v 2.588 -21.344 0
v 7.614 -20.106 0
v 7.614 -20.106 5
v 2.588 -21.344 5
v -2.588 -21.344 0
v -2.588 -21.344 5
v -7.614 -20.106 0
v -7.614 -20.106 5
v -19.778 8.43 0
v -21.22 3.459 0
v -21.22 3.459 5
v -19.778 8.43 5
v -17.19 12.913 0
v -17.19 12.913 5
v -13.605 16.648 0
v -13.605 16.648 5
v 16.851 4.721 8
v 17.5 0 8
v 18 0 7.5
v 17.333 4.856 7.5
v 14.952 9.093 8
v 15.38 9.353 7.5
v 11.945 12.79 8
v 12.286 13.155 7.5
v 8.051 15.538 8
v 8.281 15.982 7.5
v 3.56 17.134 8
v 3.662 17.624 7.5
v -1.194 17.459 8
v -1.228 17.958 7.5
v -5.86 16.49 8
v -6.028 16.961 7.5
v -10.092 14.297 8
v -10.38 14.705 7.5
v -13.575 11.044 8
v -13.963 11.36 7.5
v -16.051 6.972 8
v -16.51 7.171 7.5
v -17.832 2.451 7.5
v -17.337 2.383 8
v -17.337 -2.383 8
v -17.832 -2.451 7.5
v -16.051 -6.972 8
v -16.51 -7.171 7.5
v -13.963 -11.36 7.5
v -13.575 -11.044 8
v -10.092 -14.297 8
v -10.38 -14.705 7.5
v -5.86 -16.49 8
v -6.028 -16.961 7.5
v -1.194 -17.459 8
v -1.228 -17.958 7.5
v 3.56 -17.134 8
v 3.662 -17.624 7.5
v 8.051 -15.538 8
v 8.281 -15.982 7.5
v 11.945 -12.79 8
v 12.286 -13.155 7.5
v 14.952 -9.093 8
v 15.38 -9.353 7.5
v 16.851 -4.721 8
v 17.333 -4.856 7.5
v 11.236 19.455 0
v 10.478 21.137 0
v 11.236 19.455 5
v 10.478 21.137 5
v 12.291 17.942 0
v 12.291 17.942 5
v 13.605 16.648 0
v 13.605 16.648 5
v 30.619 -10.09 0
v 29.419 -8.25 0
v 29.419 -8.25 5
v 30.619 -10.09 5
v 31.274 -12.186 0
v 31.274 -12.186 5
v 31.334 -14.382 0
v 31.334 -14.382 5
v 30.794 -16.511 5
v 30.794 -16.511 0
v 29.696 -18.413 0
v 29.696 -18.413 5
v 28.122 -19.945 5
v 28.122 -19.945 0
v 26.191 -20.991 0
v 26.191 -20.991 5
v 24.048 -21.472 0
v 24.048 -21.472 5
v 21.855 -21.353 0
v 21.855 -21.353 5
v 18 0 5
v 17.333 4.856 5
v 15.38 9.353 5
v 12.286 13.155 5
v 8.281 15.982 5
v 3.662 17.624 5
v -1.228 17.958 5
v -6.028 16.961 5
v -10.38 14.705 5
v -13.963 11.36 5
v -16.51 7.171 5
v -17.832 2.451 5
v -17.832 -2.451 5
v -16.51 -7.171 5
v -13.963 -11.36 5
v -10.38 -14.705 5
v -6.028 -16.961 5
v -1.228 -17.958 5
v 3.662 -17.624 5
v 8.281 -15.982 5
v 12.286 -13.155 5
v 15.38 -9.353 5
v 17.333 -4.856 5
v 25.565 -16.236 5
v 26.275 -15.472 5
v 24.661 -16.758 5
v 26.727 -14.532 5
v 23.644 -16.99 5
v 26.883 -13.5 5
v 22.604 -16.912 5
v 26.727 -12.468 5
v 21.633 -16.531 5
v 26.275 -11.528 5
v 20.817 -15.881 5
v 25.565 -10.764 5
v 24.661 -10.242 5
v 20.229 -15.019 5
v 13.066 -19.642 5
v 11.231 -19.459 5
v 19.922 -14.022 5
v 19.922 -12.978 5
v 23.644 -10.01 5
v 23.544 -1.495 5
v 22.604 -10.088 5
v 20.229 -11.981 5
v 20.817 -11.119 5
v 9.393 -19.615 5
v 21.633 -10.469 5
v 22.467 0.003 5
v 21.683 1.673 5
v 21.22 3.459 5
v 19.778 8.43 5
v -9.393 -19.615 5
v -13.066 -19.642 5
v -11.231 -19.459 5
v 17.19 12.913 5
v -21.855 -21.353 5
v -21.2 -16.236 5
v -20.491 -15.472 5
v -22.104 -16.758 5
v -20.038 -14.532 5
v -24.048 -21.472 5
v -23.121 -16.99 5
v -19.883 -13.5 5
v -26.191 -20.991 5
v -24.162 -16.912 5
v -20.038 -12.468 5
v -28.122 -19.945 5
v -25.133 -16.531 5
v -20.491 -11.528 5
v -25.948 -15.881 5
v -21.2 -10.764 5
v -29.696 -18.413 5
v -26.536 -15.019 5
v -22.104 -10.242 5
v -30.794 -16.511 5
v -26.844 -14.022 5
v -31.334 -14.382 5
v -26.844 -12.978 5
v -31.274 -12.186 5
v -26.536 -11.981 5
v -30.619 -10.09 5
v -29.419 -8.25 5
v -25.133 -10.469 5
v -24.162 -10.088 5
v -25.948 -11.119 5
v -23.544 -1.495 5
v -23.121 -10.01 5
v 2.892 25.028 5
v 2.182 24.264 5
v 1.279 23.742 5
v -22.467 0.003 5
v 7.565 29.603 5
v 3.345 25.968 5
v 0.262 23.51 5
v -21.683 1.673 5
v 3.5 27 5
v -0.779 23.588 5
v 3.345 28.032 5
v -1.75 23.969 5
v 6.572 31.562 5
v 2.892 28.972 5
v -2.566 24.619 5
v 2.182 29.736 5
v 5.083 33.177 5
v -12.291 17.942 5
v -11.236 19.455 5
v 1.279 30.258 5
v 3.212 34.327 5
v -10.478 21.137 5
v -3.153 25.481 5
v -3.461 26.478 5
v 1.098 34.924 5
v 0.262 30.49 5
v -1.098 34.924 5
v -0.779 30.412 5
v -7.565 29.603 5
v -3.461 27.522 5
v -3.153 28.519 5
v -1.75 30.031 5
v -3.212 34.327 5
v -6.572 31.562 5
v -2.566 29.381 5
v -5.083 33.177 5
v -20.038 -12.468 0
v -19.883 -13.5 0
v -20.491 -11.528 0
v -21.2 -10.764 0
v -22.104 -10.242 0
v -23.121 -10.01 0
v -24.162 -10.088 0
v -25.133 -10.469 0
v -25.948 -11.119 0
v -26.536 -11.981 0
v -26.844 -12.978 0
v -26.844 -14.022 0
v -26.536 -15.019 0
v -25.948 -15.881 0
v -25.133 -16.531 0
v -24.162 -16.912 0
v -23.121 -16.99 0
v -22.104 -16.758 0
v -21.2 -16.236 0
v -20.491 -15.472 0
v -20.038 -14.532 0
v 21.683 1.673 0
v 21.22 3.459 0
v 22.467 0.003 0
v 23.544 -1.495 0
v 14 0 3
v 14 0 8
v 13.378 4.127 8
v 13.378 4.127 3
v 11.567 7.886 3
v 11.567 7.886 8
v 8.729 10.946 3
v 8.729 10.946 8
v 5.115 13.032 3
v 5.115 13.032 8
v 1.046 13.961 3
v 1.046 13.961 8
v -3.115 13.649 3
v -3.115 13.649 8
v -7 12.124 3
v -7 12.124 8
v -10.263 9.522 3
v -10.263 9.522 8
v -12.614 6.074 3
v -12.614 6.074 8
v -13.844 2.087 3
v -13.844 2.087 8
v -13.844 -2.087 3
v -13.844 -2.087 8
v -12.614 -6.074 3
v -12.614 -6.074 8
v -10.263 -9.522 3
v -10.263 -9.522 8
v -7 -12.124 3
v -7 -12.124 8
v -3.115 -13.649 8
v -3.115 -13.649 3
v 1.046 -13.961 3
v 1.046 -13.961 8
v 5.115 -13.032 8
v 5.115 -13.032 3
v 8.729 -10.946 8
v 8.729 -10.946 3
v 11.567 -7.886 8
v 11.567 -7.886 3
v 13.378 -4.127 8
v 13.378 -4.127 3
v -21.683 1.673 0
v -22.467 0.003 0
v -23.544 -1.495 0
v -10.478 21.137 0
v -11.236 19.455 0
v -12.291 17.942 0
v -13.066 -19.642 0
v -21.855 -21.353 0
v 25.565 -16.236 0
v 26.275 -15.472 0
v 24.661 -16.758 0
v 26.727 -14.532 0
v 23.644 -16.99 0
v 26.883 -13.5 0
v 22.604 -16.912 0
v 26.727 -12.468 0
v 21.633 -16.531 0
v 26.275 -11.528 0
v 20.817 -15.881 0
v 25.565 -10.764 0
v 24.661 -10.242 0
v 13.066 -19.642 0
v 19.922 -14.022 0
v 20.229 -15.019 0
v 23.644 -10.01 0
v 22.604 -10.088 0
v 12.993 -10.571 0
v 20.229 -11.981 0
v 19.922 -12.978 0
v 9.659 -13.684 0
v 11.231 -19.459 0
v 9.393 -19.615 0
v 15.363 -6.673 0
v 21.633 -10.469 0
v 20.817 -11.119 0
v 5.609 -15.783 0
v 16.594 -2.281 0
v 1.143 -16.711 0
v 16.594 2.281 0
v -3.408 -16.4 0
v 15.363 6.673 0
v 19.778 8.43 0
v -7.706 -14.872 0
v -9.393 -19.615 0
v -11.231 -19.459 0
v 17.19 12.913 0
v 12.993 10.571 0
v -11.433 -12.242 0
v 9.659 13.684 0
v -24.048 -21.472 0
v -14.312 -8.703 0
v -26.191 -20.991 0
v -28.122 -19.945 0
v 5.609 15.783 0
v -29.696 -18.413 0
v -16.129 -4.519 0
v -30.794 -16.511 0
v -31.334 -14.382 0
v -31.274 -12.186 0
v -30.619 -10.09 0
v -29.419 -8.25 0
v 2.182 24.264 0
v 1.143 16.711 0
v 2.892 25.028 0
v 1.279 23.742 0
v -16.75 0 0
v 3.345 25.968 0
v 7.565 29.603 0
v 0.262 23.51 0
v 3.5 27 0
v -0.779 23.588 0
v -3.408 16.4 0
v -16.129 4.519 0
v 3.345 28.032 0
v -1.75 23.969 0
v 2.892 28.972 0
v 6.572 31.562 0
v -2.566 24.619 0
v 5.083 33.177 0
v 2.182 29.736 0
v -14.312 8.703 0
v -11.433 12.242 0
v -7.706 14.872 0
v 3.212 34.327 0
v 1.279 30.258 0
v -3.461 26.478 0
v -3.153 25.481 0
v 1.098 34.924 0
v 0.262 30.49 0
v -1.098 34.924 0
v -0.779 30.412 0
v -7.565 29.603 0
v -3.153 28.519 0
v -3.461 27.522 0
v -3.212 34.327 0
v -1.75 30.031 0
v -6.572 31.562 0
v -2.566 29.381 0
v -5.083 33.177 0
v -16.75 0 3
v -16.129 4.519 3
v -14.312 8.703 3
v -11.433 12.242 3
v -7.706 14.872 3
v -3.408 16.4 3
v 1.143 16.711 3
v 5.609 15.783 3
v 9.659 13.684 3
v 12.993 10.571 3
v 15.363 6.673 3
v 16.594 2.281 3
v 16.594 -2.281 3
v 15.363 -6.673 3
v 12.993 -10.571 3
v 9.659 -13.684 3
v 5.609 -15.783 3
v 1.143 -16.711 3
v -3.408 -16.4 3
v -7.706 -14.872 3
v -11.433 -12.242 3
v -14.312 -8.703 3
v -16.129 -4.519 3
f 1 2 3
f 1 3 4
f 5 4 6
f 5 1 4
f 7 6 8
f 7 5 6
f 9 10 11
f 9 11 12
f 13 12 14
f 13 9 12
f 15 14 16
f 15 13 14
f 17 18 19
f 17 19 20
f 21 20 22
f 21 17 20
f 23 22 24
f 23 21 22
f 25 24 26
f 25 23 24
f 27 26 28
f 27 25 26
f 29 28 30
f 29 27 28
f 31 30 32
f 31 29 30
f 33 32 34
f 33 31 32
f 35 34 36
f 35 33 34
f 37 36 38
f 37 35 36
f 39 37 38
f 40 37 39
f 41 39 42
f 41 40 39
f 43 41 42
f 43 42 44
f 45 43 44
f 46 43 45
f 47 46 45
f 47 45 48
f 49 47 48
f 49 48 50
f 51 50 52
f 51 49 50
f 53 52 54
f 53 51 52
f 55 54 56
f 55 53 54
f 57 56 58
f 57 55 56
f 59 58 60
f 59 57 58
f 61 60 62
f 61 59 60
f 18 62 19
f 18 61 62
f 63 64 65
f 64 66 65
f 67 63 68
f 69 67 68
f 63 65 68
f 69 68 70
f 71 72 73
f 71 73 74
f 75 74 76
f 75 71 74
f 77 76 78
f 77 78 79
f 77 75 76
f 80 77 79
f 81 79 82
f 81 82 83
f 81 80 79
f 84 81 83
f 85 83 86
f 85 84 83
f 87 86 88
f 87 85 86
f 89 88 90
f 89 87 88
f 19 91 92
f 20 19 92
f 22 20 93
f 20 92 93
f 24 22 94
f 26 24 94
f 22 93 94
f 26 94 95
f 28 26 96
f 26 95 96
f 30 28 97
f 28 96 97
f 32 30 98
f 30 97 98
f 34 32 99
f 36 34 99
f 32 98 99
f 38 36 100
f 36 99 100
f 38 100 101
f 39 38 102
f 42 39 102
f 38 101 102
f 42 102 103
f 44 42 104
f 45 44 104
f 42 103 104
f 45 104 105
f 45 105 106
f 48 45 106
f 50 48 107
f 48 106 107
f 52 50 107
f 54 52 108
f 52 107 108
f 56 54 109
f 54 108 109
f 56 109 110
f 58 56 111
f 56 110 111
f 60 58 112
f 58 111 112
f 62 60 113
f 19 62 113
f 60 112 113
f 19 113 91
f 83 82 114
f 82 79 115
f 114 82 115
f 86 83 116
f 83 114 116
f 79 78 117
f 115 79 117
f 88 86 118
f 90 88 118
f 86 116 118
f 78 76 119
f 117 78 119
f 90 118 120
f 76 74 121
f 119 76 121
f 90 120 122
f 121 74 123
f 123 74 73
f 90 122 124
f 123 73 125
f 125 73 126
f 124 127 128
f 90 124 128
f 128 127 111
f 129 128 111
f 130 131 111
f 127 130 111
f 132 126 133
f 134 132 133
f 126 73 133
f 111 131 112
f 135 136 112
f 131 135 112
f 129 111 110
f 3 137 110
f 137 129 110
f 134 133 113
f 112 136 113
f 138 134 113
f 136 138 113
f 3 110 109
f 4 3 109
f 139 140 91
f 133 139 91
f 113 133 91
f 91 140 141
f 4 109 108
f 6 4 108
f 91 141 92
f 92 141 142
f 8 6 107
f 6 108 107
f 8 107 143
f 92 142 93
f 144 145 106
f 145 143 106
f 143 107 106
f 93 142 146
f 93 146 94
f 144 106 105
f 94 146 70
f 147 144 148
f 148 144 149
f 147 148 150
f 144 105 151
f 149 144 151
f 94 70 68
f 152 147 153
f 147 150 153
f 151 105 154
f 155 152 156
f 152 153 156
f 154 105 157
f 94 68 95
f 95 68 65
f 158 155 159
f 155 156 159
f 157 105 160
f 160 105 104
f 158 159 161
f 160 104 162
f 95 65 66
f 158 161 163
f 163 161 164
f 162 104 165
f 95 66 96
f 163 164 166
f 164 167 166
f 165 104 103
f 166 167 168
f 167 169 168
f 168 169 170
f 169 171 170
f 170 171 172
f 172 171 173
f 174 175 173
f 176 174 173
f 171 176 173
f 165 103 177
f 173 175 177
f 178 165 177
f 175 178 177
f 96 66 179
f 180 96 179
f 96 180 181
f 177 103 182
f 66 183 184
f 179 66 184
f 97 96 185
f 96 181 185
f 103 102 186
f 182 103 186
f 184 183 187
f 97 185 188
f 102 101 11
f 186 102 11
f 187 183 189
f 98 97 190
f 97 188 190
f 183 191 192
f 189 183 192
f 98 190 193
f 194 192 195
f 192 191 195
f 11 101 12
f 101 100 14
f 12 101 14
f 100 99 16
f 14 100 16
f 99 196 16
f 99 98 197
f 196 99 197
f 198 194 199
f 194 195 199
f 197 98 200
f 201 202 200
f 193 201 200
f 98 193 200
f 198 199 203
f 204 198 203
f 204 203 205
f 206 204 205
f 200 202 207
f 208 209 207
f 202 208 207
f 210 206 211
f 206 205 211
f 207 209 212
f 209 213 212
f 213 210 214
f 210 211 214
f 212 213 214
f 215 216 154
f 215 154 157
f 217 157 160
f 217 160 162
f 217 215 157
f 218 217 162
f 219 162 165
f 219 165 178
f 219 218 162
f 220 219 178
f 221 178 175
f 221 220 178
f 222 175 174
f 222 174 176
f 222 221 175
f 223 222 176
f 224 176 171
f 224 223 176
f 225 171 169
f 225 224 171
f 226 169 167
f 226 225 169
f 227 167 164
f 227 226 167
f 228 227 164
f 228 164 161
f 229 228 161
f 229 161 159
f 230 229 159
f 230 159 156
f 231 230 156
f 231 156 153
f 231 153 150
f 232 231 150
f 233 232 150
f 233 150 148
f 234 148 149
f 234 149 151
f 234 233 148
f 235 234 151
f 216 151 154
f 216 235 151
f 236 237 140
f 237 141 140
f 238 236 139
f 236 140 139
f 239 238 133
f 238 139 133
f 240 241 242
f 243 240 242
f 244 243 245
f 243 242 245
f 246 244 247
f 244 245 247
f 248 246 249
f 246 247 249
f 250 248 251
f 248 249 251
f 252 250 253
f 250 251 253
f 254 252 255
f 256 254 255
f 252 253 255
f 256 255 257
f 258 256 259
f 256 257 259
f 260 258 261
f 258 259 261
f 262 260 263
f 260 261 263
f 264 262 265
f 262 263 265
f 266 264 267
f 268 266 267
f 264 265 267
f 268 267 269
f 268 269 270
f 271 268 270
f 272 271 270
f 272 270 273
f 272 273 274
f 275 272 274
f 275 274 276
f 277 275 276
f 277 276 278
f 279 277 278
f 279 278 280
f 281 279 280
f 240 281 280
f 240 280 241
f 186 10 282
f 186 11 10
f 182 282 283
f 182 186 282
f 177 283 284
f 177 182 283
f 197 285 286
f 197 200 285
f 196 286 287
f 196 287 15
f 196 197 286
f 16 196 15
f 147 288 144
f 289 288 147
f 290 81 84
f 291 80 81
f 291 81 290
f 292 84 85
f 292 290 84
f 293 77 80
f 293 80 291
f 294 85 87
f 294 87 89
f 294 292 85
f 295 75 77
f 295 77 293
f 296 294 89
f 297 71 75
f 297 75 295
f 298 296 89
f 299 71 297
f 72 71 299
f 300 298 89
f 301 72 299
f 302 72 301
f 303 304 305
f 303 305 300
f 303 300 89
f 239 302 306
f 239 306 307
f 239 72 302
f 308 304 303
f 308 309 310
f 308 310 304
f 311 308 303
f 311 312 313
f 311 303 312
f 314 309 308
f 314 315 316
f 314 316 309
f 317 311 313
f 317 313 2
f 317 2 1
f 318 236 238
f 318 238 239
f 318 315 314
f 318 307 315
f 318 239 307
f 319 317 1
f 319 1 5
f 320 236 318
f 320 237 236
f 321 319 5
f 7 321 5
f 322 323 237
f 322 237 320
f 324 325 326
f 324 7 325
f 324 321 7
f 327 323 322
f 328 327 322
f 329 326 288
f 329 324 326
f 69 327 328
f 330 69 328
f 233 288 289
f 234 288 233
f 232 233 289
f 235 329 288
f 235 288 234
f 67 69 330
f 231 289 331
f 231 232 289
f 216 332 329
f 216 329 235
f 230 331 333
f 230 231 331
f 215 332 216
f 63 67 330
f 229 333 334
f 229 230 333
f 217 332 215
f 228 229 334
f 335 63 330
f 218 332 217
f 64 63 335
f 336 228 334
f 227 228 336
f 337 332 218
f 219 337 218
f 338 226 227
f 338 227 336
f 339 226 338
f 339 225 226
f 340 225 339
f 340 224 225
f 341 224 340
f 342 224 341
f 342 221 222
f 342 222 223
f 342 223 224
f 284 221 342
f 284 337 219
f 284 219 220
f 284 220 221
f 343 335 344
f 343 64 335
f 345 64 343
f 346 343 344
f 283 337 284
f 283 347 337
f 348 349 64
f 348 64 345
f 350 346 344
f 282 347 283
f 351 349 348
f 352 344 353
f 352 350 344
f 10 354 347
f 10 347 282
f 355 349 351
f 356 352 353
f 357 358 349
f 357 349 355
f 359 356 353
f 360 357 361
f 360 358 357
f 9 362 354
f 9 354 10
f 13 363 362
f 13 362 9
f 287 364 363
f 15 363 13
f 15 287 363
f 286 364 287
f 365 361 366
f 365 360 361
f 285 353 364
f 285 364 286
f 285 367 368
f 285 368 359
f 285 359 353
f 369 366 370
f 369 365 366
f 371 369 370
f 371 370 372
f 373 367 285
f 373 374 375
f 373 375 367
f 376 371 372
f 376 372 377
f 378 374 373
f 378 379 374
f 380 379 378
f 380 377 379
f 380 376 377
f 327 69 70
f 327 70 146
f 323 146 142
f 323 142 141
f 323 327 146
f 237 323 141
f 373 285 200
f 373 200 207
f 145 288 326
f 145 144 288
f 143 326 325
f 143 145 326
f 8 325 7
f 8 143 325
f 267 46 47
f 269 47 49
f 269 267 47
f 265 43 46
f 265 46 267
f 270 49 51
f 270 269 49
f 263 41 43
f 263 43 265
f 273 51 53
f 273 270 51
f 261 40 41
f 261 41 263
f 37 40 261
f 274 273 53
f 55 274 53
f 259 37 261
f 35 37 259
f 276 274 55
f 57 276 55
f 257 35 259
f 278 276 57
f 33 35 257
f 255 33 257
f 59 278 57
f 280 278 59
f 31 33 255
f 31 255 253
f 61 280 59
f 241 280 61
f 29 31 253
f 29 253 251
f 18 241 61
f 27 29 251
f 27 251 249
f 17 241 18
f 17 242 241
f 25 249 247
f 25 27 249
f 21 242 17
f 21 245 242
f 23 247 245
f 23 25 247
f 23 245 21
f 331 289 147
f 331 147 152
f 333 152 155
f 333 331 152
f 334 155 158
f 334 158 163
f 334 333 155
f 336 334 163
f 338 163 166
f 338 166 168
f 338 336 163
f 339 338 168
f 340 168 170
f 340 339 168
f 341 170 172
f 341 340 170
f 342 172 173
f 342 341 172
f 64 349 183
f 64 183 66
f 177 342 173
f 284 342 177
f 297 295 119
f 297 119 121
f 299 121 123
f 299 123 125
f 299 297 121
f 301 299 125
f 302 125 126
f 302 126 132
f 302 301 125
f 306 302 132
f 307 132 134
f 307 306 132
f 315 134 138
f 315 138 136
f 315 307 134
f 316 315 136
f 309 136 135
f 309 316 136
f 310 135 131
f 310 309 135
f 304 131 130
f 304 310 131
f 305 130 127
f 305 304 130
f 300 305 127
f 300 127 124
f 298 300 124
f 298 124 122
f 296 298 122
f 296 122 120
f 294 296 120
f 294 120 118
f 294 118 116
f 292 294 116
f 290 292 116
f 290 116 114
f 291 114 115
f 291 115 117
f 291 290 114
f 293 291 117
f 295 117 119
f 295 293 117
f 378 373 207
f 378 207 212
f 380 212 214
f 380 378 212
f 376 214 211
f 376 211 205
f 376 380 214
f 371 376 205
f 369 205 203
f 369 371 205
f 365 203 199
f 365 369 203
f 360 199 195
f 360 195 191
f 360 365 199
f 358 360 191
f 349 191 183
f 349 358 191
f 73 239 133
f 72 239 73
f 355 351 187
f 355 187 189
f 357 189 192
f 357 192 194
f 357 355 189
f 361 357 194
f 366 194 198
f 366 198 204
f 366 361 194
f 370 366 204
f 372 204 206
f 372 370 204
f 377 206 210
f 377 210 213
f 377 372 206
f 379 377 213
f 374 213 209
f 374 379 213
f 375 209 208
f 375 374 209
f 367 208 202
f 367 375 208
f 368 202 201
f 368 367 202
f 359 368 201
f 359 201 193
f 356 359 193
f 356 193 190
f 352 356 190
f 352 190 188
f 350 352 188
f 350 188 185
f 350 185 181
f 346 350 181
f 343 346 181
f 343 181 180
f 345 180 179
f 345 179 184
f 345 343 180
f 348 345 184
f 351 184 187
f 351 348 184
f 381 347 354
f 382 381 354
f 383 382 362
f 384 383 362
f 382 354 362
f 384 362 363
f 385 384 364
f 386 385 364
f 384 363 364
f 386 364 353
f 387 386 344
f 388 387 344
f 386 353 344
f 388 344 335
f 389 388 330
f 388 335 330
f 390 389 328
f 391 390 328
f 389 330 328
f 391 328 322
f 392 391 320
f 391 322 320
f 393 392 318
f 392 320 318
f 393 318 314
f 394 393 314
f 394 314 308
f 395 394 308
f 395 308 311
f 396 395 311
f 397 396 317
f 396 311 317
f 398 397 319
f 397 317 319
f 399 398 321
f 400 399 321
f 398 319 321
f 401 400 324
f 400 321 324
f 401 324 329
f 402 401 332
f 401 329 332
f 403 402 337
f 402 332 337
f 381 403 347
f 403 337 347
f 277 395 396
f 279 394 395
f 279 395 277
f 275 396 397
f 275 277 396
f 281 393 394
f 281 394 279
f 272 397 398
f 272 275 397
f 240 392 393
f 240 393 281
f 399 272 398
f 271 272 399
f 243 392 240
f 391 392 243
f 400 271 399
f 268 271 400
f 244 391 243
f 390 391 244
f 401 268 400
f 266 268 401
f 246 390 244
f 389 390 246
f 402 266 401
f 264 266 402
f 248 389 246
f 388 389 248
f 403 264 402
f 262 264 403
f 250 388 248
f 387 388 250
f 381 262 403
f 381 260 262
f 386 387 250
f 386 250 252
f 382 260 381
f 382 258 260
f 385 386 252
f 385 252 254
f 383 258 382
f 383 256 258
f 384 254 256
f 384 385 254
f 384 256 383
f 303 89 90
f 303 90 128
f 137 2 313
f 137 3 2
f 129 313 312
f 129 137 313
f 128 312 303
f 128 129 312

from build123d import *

# Parameters (mm, degrees)
SKETCH_1_R          = 3.5
EXTRUDE_1_DEPTH     = 5
FILLET_1_R          = 10
SKETCH_2_R          = 18
EXTRUDE_2_DEPTH     = 3
SKETCH_3_R          = 14
CUT_EXTRUDE_1_DEPTH = 32
SKETCH_4_R          = 16.75
CUT_EXTRUDE_2_DEPTH = 3
CHAMFER_1_SIZE      = 0.5


with BuildPart() as part:
    # 草图1 → 凸台-拉伸1 (new body)
    with BuildSketch(Plane.XY):
        with BuildLine():
            Line((-11.5, 18.165902125), (-7.564716302, 29.602895938))
            ThreePointArc((-7.564716302, 29.602895938), (0, 35), (7.564716302, 29.602895938))
            Line((7.564716302, 29.602895938), (11.5, 18.165902125))
            ThreePointArc((11.5, 18.165902125), (18.619546181, 10.75), (21.482132723, 0.876341081))
            Line((21.482132723, 0.876341081), (29.419218059, -8.250211479))
            ThreePointArc((29.419218059, -8.250211479), (30.310889132, -17.5), (21.854501757, -21.352684459))
            Line((21.854501757, -21.352684459), (9.982132723, -19.042243206))
            ThreePointArc((9.982132723, -19.042243206), (0, -21.5), (-9.982132723, -19.042243206))
            Line((-9.982132723, -19.042243206), (-21.854501757, -21.352684459))
            ThreePointArc((-21.854501757, -21.352684459), (-30.310889132, -17.5), (-29.419218059, -8.250211479))
            Line((-29.419218059, -8.250211479), (-21.482132723, 0.876341081))
            ThreePointArc((-21.482132723, 0.876341081), (-18.619546181, 10.75), (-11.5, 18.165902125))
        make_face()
        with Locations((0, 27)):
            Circle(SKETCH_1_R, mode=Mode.SUBTRACT)
        with Locations((23.382685902, -13.5)):
            Circle(SKETCH_1_R, mode=Mode.SUBTRACT)
        with Locations((-23.382685902, -13.5)):
            Circle(SKETCH_1_R, mode=Mode.SUBTRACT)
    extrude(amount=EXTRUDE_1_DEPTH)

    # 圆角1
    fillet_1_edges = [part.edges().sort_by_distance(p)[0] for p in [
        (21.482132723, 0.876341081, 2.5),
        (9.982132723, -19.042243206, 2.5),
        (-9.982132723, -19.042243206, 2.5),
        (-21.482132723, 0.876341081, 2.5),
        (-11.5, 18.165902125, 2.5),
        (11.5, 18.165902125, 2.5),
    ]]
    fillet(fillet_1_edges, radius=FILLET_1_R)

    # 草图2 → 凸台-拉伸2 (add)
    with BuildSketch(Plane.XY.offset(5)):
        Circle(SKETCH_2_R)
    extrude(amount=EXTRUDE_2_DEPTH)

    # 草图3 → 切除-拉伸1 (cut)
    with BuildSketch(Plane.XY.offset(8)):
        Circle(SKETCH_3_R)
    extrude(amount=-CUT_EXTRUDE_1_DEPTH, mode=Mode.SUBTRACT)

    # 草图4 → 切除-拉伸2 (cut)
    with BuildSketch(Plane(origin=(0, 0, 0), x_dir=(-1, 0, 0), z_dir=(0, 0, -1))):
        Circle(SKETCH_4_R)
    extrude(amount=-CUT_EXTRUDE_2_DEPTH, mode=Mode.SUBTRACT)

    # 倒角1
    chamfer_1_edges = [part.edges().sort_by_distance(p)[0] for p in [
        (-18, 0, 8),
    ]]
    chamfer(chamfer_1_edges, length=CHAMFER_1_SIZE)


solid = part.part
